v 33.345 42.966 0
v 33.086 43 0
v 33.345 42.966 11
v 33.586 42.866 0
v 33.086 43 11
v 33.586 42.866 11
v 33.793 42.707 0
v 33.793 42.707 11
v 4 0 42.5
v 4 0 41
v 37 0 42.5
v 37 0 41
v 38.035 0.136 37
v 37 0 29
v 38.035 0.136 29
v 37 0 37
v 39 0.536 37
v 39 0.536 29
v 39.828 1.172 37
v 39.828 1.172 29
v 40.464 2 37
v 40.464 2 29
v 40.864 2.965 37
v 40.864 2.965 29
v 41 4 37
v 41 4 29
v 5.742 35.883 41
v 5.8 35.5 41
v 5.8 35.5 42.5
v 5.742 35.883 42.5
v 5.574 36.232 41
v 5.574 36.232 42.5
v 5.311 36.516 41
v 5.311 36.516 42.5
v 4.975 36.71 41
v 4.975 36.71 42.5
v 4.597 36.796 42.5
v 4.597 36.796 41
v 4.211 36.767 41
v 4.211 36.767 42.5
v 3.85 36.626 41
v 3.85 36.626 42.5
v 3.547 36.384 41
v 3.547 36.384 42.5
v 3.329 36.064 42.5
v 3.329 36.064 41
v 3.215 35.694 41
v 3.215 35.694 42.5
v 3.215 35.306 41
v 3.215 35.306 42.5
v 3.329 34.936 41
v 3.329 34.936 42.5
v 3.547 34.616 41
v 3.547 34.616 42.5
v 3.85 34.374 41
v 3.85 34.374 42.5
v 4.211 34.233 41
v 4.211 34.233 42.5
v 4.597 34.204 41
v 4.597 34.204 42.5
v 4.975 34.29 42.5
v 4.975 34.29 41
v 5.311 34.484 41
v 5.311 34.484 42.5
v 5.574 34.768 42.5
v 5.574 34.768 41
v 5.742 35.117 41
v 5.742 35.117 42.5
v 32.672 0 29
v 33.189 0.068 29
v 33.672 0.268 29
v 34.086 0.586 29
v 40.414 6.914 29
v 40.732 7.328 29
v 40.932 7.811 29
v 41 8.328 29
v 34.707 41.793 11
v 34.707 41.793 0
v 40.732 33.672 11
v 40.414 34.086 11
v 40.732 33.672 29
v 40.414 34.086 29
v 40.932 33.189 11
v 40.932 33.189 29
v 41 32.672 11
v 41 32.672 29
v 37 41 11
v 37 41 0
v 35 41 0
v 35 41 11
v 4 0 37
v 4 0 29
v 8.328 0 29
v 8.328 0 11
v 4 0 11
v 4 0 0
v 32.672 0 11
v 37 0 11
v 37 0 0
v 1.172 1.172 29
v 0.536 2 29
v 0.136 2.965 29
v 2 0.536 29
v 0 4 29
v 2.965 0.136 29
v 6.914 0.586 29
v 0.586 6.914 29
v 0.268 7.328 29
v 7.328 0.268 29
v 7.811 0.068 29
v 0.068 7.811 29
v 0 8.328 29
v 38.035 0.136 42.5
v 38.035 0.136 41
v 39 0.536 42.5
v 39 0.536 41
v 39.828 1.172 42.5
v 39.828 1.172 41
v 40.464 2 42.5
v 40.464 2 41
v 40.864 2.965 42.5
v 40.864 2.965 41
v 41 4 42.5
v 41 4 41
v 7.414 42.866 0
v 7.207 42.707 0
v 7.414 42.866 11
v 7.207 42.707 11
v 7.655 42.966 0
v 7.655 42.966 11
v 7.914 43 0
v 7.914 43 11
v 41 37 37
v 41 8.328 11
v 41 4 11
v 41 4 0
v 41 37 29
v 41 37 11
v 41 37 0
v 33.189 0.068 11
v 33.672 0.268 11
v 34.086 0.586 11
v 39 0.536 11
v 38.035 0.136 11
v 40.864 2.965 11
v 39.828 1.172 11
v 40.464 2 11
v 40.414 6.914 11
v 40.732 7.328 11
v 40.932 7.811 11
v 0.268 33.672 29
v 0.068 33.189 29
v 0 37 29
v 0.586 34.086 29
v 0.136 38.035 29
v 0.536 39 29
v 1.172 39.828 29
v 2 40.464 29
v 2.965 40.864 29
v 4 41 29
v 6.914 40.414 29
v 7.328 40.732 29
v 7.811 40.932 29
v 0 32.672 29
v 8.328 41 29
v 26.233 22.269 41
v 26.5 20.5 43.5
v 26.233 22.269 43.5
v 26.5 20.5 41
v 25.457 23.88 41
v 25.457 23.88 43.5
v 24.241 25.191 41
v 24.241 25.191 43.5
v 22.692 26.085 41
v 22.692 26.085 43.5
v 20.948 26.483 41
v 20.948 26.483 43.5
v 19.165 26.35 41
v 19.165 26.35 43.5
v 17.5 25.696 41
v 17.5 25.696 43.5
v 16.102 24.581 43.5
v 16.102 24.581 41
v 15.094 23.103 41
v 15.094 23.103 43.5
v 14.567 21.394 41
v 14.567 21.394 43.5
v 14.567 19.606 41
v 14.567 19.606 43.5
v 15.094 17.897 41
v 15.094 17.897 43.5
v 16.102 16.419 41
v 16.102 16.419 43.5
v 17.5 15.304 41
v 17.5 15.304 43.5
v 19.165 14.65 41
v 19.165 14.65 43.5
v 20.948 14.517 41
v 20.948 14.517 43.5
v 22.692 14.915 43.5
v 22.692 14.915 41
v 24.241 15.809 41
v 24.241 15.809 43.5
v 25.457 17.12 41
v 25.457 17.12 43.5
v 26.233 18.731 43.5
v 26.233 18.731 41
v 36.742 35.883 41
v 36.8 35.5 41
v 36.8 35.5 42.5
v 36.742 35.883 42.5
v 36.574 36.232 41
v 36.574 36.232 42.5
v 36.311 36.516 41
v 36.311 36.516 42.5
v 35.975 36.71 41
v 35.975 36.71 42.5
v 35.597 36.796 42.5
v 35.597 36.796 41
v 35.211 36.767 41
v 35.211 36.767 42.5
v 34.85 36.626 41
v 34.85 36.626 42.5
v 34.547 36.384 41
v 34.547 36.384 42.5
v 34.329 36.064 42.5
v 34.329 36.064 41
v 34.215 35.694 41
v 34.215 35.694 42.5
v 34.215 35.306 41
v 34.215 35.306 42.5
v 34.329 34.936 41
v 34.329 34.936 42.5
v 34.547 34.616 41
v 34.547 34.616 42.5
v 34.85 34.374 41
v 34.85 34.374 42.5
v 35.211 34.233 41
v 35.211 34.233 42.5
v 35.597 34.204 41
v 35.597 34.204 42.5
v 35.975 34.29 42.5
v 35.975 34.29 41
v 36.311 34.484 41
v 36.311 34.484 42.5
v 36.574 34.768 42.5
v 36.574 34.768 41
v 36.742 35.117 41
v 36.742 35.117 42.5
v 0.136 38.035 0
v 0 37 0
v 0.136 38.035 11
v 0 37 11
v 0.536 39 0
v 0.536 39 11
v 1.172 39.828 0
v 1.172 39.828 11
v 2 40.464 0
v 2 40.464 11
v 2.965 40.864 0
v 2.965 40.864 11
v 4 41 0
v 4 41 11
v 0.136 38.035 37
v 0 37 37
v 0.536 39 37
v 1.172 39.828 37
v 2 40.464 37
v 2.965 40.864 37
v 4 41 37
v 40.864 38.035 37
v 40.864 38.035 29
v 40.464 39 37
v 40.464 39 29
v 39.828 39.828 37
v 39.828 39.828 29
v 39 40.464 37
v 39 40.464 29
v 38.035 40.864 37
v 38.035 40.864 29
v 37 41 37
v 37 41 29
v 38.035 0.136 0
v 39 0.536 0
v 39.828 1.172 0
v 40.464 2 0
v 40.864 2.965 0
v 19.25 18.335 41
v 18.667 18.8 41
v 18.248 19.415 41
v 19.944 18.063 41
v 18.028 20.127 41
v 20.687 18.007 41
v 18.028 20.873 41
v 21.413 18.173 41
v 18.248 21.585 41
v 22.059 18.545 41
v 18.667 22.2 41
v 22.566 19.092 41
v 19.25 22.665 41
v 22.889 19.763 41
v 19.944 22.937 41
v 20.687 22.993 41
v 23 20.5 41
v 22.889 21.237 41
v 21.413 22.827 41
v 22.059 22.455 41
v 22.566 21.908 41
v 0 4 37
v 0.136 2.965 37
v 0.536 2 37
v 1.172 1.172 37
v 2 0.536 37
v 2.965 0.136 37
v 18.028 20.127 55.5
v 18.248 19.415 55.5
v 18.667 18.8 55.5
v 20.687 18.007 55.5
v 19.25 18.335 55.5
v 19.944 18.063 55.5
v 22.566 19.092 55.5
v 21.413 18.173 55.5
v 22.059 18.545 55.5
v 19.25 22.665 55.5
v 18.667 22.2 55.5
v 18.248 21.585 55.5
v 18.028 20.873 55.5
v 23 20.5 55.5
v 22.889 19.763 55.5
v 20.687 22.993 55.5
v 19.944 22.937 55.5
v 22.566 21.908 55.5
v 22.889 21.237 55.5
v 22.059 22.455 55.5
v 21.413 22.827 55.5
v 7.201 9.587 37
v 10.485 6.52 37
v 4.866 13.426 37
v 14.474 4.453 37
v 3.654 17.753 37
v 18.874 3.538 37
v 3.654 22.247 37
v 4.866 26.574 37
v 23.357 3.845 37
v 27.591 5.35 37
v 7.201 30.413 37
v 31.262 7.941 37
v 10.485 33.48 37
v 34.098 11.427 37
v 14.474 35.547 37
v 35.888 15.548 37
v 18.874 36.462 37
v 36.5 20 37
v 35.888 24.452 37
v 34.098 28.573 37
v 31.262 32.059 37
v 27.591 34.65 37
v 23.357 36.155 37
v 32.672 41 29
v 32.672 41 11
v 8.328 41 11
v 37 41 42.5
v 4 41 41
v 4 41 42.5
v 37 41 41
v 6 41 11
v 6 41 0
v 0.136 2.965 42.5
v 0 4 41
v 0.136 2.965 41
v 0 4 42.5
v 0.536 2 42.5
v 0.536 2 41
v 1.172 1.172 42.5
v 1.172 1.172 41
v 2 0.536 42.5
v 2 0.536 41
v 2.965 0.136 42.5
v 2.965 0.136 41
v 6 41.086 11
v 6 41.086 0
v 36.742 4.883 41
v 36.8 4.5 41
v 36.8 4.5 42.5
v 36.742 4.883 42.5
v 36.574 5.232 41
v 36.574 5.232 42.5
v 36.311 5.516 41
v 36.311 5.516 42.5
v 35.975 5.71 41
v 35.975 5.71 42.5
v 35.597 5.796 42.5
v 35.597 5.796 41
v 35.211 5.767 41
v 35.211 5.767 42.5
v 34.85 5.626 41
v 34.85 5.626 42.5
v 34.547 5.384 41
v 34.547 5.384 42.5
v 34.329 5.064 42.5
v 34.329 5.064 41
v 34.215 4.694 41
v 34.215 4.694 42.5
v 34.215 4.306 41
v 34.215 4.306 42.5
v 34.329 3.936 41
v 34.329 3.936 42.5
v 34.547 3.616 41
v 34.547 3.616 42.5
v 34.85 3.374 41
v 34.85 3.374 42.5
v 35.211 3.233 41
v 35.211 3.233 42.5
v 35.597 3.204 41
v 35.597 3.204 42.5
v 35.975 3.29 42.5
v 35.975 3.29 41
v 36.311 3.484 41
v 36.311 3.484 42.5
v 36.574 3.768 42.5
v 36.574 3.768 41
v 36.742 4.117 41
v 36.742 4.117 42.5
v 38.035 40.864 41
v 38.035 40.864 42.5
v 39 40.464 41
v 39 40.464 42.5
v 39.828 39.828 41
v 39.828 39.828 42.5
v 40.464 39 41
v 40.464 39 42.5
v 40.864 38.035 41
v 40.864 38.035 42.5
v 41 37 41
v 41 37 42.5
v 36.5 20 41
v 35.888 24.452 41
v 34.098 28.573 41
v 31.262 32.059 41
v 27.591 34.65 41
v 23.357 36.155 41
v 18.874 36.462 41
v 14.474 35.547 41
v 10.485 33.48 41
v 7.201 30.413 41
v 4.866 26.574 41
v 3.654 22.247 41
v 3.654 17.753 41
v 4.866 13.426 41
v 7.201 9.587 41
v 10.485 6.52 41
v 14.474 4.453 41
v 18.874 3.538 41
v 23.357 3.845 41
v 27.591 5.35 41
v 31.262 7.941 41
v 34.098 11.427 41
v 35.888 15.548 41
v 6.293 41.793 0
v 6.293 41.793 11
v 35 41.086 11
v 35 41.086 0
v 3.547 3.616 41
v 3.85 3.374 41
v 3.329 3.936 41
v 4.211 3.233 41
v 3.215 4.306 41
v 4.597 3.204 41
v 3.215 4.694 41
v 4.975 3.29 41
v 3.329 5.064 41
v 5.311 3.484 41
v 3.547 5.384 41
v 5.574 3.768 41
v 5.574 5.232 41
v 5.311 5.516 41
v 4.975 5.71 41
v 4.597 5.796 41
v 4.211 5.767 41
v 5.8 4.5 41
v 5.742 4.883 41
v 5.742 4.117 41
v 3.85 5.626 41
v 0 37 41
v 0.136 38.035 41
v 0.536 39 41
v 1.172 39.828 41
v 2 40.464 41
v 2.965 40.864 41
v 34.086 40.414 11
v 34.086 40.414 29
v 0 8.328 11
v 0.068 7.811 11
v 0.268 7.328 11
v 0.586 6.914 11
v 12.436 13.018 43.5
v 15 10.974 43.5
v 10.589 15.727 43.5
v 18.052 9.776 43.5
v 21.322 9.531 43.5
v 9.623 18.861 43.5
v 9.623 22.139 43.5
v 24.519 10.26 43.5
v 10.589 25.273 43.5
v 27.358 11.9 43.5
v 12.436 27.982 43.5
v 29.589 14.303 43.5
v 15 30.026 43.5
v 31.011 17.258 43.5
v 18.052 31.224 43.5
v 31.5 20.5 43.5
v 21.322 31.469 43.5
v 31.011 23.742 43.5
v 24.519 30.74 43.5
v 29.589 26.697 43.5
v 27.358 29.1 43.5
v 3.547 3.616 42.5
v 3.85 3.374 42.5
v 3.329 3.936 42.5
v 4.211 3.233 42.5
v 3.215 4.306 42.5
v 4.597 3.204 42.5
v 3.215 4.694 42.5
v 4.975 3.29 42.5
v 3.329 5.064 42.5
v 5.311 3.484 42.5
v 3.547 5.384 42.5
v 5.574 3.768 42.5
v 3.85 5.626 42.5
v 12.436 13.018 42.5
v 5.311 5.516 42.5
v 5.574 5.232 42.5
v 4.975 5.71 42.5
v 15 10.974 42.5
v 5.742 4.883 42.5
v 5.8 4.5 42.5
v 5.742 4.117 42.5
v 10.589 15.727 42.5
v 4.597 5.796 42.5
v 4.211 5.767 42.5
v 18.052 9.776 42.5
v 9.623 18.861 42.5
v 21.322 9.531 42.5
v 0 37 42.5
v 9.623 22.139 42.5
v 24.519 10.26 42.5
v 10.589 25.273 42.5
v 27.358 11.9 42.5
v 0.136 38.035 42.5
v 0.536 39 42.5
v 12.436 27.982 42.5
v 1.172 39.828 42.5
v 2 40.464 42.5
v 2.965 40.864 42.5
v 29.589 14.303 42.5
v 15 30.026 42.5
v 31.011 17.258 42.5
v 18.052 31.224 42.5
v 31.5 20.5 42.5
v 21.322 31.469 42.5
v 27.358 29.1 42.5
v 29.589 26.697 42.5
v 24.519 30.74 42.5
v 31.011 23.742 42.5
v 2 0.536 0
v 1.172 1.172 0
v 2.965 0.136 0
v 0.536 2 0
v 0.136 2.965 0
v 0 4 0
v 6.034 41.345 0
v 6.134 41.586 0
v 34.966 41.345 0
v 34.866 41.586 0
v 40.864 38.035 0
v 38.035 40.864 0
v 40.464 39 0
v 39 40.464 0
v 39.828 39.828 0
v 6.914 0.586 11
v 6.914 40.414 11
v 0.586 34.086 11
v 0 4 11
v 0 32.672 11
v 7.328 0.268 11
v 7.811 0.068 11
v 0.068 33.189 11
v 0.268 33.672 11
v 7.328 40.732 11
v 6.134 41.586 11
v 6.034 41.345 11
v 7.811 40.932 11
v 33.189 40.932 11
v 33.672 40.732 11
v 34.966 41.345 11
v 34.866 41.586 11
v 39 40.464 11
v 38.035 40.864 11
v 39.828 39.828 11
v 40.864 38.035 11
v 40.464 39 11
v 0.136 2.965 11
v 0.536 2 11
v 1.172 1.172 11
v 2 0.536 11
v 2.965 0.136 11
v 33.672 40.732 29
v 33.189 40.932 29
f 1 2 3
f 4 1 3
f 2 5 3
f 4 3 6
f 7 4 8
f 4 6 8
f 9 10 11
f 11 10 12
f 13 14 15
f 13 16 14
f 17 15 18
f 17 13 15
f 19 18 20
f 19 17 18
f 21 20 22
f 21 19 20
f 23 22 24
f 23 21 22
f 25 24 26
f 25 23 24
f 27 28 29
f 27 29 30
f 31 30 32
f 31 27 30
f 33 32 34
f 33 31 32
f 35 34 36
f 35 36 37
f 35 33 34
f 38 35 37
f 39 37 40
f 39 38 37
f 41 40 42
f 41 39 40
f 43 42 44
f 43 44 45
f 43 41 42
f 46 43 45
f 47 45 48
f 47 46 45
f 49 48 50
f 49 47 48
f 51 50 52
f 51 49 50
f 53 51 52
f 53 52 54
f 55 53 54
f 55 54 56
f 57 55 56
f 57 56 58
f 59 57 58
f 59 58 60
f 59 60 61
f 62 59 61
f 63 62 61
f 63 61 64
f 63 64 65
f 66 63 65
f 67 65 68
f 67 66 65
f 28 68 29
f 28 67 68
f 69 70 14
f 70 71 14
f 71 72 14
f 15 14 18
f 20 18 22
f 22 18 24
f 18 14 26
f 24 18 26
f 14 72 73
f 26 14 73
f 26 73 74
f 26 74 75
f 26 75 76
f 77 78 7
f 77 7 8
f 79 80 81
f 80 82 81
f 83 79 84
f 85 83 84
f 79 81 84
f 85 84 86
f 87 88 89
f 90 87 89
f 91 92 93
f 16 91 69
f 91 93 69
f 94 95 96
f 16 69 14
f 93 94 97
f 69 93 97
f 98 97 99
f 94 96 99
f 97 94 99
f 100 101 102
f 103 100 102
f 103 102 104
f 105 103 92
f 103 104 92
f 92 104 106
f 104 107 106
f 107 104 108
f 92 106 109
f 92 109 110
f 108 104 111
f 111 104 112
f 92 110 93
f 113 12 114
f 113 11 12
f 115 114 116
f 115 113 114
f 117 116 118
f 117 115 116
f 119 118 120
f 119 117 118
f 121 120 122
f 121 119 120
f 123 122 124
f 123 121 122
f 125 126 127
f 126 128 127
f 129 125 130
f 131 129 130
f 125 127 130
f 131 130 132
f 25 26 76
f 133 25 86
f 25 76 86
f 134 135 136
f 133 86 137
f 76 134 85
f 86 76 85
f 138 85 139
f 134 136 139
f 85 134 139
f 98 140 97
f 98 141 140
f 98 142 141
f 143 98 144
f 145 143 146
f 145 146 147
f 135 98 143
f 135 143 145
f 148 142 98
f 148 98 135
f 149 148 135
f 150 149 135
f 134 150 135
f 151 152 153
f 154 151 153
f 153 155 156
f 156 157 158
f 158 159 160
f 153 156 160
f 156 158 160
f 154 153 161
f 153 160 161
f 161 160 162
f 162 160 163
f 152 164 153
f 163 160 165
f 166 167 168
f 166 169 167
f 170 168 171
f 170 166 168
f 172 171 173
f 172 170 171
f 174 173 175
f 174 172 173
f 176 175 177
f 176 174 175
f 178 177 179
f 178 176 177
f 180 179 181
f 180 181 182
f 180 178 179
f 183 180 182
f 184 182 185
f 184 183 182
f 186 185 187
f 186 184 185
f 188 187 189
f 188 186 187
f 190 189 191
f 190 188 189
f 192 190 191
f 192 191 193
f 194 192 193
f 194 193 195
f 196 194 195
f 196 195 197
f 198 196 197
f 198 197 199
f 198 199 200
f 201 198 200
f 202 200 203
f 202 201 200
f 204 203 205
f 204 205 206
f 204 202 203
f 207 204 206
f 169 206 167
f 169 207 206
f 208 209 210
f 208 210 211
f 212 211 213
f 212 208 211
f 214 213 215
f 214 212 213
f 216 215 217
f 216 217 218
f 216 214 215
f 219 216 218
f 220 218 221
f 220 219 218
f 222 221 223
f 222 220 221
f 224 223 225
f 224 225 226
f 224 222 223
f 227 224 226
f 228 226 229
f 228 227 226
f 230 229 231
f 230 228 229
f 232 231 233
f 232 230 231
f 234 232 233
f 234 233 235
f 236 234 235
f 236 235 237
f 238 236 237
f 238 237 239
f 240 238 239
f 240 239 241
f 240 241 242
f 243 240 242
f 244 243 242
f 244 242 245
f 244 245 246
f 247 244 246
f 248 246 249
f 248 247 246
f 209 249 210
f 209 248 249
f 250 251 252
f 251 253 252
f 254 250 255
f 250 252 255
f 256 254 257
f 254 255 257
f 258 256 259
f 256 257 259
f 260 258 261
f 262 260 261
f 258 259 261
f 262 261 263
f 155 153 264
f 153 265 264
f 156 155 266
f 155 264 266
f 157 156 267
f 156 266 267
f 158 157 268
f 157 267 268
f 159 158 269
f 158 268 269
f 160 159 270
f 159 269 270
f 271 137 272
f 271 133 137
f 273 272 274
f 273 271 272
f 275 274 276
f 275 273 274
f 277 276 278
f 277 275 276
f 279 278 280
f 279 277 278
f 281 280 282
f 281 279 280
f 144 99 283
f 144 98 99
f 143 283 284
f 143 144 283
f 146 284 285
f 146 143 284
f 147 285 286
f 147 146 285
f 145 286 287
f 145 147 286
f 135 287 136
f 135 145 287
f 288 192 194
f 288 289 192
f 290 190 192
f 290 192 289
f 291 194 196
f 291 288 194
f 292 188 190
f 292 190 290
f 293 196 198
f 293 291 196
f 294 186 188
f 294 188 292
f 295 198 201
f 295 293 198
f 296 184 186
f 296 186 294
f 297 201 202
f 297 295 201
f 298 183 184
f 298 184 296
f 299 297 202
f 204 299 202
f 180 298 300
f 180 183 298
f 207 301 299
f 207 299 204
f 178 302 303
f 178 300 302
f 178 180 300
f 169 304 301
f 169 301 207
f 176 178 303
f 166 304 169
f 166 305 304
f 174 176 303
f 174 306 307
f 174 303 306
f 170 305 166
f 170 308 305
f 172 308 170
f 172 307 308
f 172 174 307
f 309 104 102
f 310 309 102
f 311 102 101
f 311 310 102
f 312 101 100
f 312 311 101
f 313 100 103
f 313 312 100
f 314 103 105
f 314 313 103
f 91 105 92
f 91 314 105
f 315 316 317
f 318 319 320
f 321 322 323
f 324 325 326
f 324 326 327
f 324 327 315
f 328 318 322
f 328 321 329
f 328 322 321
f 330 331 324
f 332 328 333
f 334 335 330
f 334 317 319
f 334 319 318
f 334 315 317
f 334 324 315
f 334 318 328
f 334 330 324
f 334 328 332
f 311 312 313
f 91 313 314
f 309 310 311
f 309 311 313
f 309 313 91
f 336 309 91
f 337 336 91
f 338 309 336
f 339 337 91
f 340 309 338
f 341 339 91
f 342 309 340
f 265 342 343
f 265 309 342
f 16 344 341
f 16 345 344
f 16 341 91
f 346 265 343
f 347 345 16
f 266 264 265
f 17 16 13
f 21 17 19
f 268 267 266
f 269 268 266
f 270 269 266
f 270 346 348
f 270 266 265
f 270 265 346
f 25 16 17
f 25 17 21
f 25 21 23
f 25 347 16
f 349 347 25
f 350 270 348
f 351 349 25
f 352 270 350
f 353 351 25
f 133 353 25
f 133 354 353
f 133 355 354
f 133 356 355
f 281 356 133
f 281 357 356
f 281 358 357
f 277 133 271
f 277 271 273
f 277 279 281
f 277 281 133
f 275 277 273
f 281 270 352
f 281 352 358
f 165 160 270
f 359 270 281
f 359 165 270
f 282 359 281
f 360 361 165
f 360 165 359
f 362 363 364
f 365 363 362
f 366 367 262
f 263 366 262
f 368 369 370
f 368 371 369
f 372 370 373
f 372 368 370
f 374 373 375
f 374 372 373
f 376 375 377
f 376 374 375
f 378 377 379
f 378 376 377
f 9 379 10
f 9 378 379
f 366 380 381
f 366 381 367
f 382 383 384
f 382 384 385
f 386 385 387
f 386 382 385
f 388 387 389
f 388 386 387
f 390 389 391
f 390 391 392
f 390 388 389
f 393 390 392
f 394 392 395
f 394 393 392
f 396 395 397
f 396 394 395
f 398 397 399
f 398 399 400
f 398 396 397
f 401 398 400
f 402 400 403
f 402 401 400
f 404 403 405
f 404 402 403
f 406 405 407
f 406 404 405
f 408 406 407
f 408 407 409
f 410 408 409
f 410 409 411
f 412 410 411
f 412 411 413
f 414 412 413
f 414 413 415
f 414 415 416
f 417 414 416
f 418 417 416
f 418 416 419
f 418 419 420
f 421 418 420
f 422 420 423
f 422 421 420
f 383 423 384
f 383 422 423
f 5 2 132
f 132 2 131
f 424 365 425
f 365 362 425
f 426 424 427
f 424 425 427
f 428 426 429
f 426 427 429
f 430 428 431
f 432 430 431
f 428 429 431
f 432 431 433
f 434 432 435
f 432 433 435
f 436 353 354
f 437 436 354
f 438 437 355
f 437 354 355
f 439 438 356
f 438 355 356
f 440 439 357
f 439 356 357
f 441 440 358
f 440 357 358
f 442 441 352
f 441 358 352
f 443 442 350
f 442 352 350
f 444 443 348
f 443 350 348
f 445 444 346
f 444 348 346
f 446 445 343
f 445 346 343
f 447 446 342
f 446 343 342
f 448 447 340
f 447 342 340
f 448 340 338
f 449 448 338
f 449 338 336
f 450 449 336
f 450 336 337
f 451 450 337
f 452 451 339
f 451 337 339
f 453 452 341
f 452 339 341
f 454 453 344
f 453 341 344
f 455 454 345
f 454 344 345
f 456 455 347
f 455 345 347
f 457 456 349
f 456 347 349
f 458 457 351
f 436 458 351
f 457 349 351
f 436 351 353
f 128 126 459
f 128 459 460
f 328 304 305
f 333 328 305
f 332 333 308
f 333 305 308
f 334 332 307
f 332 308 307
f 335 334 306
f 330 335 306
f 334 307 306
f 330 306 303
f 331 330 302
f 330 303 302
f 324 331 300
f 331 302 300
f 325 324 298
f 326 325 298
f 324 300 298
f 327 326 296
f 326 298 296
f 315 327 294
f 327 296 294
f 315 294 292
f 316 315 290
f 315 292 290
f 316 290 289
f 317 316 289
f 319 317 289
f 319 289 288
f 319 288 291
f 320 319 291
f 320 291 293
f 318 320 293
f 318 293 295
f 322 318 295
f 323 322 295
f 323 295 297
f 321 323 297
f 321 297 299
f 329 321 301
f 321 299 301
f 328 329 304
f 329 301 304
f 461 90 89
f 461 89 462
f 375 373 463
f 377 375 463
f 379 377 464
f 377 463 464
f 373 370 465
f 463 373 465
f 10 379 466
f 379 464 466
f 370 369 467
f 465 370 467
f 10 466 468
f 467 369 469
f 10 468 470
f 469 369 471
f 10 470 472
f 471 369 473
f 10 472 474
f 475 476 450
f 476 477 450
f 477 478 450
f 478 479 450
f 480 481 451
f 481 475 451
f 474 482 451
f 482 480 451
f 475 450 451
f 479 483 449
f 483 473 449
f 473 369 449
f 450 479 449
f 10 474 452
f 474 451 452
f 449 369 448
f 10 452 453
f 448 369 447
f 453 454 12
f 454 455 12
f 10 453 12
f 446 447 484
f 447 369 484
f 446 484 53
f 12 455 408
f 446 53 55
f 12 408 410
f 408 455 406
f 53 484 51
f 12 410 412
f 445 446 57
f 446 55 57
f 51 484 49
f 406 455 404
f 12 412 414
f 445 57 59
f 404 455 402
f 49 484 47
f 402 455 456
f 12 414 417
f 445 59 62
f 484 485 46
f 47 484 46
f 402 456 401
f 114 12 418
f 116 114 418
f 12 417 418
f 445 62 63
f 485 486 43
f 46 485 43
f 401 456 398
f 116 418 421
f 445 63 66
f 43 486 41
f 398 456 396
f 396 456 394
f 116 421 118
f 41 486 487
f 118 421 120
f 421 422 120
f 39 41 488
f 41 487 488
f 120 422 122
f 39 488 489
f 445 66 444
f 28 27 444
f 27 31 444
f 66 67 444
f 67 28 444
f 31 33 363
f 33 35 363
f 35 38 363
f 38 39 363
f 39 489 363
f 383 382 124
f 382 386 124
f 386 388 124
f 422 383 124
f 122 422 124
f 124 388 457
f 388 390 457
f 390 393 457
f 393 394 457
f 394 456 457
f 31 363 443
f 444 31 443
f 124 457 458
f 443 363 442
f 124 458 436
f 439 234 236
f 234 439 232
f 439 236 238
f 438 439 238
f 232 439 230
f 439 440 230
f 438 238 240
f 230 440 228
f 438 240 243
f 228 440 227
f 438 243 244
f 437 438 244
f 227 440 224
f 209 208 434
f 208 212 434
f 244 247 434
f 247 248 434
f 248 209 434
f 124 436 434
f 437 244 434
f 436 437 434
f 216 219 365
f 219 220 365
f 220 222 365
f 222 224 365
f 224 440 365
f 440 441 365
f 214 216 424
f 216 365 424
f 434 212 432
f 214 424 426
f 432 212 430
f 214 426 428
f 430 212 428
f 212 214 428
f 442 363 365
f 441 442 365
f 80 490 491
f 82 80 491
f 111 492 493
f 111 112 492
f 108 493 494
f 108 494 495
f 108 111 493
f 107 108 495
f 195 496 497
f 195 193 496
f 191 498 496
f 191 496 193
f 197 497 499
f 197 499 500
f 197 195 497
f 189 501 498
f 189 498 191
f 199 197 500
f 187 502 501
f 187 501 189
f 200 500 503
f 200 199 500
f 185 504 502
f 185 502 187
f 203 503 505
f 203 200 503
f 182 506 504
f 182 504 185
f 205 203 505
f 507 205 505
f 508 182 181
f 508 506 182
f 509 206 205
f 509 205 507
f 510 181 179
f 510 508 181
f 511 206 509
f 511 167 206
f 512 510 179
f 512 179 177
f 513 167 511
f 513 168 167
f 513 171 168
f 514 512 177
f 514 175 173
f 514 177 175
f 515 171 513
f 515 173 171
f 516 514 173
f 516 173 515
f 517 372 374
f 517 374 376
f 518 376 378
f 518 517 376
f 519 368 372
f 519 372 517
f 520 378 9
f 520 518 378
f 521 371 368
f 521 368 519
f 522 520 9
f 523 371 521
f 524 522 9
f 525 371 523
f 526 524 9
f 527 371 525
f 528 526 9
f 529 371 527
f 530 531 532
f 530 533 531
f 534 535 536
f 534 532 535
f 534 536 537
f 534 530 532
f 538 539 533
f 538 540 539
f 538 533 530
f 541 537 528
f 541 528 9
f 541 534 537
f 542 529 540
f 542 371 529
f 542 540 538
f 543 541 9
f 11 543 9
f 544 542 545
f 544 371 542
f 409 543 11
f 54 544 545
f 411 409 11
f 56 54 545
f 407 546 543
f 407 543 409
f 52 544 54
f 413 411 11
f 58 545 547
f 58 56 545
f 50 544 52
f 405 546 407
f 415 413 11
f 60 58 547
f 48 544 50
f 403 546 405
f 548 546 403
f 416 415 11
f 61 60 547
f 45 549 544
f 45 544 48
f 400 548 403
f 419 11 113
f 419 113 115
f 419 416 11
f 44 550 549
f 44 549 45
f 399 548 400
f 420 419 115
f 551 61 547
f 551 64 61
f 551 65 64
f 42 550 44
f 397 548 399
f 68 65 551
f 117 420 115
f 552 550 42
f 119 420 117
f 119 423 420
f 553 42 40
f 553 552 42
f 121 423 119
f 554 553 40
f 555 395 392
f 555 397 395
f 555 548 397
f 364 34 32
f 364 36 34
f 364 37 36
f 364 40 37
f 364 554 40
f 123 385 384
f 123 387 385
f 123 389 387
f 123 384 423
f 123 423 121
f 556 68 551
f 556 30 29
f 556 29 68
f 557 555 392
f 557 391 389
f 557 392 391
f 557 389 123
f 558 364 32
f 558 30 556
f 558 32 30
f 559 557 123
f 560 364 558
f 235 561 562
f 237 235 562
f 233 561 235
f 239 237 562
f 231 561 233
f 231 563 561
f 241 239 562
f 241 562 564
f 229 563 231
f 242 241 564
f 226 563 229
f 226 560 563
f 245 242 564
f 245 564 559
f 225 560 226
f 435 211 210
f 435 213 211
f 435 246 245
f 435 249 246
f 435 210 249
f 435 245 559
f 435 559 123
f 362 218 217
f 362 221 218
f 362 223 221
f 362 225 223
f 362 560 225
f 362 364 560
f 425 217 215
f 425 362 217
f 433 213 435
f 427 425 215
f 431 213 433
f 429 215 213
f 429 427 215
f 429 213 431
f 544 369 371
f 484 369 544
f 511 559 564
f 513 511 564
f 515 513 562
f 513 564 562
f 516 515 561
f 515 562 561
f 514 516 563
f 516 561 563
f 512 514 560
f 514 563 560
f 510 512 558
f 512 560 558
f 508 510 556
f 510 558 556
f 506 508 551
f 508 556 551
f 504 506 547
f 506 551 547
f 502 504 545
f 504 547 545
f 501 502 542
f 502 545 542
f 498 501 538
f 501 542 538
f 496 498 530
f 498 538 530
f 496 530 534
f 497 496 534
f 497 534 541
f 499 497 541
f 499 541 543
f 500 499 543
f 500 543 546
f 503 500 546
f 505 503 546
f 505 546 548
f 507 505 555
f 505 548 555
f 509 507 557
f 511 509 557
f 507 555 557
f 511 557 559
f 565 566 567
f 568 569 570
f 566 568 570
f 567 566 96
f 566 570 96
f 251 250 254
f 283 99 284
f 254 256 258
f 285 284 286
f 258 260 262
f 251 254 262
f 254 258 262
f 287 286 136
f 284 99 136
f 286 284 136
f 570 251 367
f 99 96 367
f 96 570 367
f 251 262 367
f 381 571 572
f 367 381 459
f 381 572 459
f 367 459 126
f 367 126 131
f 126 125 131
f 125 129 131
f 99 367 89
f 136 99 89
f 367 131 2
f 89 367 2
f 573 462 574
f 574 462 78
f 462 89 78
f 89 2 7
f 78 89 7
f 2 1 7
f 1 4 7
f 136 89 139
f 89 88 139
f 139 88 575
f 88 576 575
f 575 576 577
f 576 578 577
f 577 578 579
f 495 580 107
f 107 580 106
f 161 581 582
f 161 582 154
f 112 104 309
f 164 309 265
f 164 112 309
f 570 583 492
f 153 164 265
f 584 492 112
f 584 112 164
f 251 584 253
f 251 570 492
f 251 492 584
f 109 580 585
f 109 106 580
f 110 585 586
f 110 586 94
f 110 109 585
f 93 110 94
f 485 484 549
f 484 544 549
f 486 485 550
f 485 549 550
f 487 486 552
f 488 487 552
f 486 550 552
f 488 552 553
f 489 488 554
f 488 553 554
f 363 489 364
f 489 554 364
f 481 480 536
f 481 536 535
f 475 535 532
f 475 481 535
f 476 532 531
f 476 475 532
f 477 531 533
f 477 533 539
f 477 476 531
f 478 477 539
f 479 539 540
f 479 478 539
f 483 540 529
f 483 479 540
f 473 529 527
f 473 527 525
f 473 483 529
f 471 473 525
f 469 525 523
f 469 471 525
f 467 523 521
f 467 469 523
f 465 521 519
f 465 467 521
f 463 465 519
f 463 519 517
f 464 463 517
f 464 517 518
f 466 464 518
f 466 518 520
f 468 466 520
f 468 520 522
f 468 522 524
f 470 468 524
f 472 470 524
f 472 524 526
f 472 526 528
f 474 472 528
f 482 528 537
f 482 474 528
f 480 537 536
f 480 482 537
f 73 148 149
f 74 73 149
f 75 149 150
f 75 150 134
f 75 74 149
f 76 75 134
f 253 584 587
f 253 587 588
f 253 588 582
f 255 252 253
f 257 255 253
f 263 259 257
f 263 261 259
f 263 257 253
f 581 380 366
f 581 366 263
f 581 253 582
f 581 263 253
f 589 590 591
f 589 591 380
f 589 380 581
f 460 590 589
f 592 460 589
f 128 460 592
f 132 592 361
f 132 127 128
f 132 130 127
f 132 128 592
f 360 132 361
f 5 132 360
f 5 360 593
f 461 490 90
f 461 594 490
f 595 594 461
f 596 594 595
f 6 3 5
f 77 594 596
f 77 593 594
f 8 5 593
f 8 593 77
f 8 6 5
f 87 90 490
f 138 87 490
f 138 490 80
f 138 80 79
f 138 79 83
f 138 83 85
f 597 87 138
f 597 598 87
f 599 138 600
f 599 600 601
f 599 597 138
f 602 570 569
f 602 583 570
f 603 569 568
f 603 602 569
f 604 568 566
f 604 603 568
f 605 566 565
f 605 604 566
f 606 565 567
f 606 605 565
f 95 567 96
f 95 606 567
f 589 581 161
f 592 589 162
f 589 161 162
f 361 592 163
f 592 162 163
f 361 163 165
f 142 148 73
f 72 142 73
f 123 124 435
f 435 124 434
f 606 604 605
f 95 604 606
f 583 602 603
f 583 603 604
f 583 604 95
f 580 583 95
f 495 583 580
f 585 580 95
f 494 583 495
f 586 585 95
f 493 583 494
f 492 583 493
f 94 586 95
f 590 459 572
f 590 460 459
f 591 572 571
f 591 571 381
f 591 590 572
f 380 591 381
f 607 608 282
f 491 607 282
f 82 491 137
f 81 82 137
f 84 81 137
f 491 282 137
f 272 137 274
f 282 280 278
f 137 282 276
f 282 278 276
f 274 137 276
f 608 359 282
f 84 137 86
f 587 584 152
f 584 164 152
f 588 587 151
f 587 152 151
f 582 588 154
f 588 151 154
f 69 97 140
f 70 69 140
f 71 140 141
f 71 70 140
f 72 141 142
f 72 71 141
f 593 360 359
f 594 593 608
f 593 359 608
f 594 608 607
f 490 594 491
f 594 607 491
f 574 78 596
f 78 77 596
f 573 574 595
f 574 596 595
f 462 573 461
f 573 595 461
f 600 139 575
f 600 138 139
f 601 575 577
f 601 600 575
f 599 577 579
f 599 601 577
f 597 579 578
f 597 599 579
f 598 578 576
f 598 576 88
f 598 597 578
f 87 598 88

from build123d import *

# Parameters (mm, degrees)
SKETCH005_R     = 11
SKETCH005_R_2   = 6
PAD005_DEPTH    = 1
SKETCH006_R     = 2.5
PAD006_DEPTH    = 14.5
SKETCH001_W     = 41
SKETCH001_H     = 41
PAD001_DEPTH    = 18
CHAMFER_SIZE    = 7.5
FILLET_R        = 2
PAD_DEPTH       = 11
FILLET001_R     = 4
CHAMFER001_SIZE = 1.5
FILLET002_R     = 1
FILLET003_R     = 1
SKETCH002_W     = 41
SKETCH002_H     = 41
PAD002_DEPTH    = 8
FILLET004_R     = 4
SKETCH004_W     = 41
SKETCH004_H     = 41
SKETCH004_R     = 1.3
SKETCH004_R_2   = 6
PAD004_DEPTH    = 1.5
FILLET005_R     = 4
SKETCH003_R     = 16.5
PAD003_DEPTH    = 4


with BuildPart() as pad005:
    # Sketch005 → Pad005 (new body)
    with BuildSketch(Plane.XY.offset(42.5)):
        with Locations((20.5, 20.5)):
            Circle(SKETCH005_R)
        with Locations((20.5, 20.5)):
            Circle(SKETCH005_R_2, mode=Mode.SUBTRACT)
    extrude(amount=PAD005_DEPTH)


with BuildPart() as pad006:
    # Sketch006 → Pad006 (new body)
    with BuildSketch(Plane.XY.offset(41)):
        with Locations((20.5, 20.5)):
            Circle(SKETCH006_R)
    extrude(amount=PAD006_DEPTH)


with BuildPart() as fillet_body:
    # Sketch001 → Pad001 (new body)
    with BuildSketch(Plane.XY.offset(11)):
        with Locations((20.5, 20.5)):
            Rectangle(SKETCH001_W, SKETCH001_H)
    extrude(amount=PAD001_DEPTH)

    # Chamfer
    chamfer_edges = [fillet_body.edges().sort_by_distance(p)[0] for p in [
        (0, 41, 20),
        (41, 41, 20),
        (41, 0, 20),
        (0, 0, 20),
    ]]
    chamfer(chamfer_edges, length=CHAMFER_SIZE)

    # Fillet
    fillet_edges = [fillet_body.edges().sort_by_distance(p)[0] for p in [
        (33.5, 0, 20),
        (41, 7.5, 20),
        (7.5, 0, 20),
        (0, 7.5, 20),
        (0, 33.5, 20),
        (7.5, 41, 20),
        (33.5, 41, 20),
        (41, 33.5, 20),
    ]]
    fillet(fillet_edges, radius=FILLET_R)


with BuildPart() as fillet003:
    # Sketch → Pad (new body)
    with BuildSketch(Plane.XY):
        Polygon((0, 41), (0, 0), (41, 0), (41, 41), (35, 41), (35, 43), (6, 43), (6, 41), align=None)
    extrude(amount=PAD_DEPTH)

    # Fillet001
    fillet001_edges = [fillet003.edges().sort_by_distance(p)[0] for p in [
        (0, 0, 5.5),
        (41, 0, 5.5),
        (0, 41, 5.5),
        (41, 41, 5.5),
    ]]
    fillet(fillet001_edges, radius=FILLET001_R)

    # Chamfer001
    chamfer001_edges = [fillet003.edges().sort_by_distance(p)[0] for p in [
        (6, 43, 5.5),
        (35, 43, 5.5),
    ]]
    chamfer(chamfer001_edges, length=CHAMFER001_SIZE)

    # Fillet002
    fillet002_edges = [fillet003.edges().sort_by_distance(p)[0] for p in [
        (33.5, 43, 5.5),
        (7.5, 43, 5.5),
    ]]
    fillet(fillet002_edges, radius=FILLET002_R)

    # Fillet003
    fillet003_edges = [fillet003.edges().sort_by_distance(p)[0] for p in [
        (35, 41.5, 5.5),
        (6, 41.5, 5.5),
    ]]
    fillet(fillet003_edges, radius=FILLET003_R)


with BuildPart() as fillet004:
    # Sketch002 → Pad002 (new body)
    with BuildSketch(Plane.XY.offset(29)):
        with Locations((20.5, 20.5)):
            Rectangle(SKETCH002_W, SKETCH002_H)
    extrude(amount=PAD002_DEPTH)

    # Fillet004
    fillet004_edges = [fillet004.edges().sort_by_distance(p)[0] for p in [
        (0, 41, 33),
        (41, 41, 33),
        (0, 0, 33),
        (41, 0, 33),
    ]]
    fillet(fillet004_edges, radius=FILLET004_R)


with BuildPart() as fillet005:
    # Sketch004 → Pad004 (new body)
    with BuildSketch(Plane.XY.offset(41)):
        with Locations((20.5, 20.5)):
            Rectangle(SKETCH004_W, SKETCH004_H)
        with Locations((4.5, 35.5)):
            Circle(SKETCH004_R, mode=Mode.SUBTRACT)
        with Locations((35.5, 35.5)):
            Circle(SKETCH004_R, mode=Mode.SUBTRACT)
        with Locations((4.5, 4.5)):
            Circle(SKETCH004_R, mode=Mode.SUBTRACT)
        with Locations((35.5, 4.5)):
            Circle(SKETCH004_R, mode=Mode.SUBTRACT)
        with Locations((20.5, 20.5)):
            Circle(SKETCH004_R_2, mode=Mode.SUBTRACT)
    extrude(amount=PAD004_DEPTH)

    # Fillet005
    fillet005_edges = [fillet005.edges().sort_by_distance(p)[0] for p in [
        (41, 0, 41.75),
        (41, 41, 41.75),
        (0, 0, 41.75),
        (0, 41, 41.75),
    ]]
    fillet(fillet005_edges, radius=FILLET005_R)


with BuildPart() as fusion:
    # Sketch003 → Pad003 (new body)
    with BuildSketch(Plane.XY.offset(37)):
        with Locations((20, 20)):
            Circle(SKETCH003_R)
    extrude(amount=PAD003_DEPTH)

    # Fusion: union Pad005, Pad006, Fillet body, Fillet003, Fillet004, Fillet005
    add(pad005.part)
    add(pad006.part)
    add(fillet_body.part)
    add(fillet003.part)
    add(fillet004.part)
    add(fillet005.part)


solid = fusion.part
